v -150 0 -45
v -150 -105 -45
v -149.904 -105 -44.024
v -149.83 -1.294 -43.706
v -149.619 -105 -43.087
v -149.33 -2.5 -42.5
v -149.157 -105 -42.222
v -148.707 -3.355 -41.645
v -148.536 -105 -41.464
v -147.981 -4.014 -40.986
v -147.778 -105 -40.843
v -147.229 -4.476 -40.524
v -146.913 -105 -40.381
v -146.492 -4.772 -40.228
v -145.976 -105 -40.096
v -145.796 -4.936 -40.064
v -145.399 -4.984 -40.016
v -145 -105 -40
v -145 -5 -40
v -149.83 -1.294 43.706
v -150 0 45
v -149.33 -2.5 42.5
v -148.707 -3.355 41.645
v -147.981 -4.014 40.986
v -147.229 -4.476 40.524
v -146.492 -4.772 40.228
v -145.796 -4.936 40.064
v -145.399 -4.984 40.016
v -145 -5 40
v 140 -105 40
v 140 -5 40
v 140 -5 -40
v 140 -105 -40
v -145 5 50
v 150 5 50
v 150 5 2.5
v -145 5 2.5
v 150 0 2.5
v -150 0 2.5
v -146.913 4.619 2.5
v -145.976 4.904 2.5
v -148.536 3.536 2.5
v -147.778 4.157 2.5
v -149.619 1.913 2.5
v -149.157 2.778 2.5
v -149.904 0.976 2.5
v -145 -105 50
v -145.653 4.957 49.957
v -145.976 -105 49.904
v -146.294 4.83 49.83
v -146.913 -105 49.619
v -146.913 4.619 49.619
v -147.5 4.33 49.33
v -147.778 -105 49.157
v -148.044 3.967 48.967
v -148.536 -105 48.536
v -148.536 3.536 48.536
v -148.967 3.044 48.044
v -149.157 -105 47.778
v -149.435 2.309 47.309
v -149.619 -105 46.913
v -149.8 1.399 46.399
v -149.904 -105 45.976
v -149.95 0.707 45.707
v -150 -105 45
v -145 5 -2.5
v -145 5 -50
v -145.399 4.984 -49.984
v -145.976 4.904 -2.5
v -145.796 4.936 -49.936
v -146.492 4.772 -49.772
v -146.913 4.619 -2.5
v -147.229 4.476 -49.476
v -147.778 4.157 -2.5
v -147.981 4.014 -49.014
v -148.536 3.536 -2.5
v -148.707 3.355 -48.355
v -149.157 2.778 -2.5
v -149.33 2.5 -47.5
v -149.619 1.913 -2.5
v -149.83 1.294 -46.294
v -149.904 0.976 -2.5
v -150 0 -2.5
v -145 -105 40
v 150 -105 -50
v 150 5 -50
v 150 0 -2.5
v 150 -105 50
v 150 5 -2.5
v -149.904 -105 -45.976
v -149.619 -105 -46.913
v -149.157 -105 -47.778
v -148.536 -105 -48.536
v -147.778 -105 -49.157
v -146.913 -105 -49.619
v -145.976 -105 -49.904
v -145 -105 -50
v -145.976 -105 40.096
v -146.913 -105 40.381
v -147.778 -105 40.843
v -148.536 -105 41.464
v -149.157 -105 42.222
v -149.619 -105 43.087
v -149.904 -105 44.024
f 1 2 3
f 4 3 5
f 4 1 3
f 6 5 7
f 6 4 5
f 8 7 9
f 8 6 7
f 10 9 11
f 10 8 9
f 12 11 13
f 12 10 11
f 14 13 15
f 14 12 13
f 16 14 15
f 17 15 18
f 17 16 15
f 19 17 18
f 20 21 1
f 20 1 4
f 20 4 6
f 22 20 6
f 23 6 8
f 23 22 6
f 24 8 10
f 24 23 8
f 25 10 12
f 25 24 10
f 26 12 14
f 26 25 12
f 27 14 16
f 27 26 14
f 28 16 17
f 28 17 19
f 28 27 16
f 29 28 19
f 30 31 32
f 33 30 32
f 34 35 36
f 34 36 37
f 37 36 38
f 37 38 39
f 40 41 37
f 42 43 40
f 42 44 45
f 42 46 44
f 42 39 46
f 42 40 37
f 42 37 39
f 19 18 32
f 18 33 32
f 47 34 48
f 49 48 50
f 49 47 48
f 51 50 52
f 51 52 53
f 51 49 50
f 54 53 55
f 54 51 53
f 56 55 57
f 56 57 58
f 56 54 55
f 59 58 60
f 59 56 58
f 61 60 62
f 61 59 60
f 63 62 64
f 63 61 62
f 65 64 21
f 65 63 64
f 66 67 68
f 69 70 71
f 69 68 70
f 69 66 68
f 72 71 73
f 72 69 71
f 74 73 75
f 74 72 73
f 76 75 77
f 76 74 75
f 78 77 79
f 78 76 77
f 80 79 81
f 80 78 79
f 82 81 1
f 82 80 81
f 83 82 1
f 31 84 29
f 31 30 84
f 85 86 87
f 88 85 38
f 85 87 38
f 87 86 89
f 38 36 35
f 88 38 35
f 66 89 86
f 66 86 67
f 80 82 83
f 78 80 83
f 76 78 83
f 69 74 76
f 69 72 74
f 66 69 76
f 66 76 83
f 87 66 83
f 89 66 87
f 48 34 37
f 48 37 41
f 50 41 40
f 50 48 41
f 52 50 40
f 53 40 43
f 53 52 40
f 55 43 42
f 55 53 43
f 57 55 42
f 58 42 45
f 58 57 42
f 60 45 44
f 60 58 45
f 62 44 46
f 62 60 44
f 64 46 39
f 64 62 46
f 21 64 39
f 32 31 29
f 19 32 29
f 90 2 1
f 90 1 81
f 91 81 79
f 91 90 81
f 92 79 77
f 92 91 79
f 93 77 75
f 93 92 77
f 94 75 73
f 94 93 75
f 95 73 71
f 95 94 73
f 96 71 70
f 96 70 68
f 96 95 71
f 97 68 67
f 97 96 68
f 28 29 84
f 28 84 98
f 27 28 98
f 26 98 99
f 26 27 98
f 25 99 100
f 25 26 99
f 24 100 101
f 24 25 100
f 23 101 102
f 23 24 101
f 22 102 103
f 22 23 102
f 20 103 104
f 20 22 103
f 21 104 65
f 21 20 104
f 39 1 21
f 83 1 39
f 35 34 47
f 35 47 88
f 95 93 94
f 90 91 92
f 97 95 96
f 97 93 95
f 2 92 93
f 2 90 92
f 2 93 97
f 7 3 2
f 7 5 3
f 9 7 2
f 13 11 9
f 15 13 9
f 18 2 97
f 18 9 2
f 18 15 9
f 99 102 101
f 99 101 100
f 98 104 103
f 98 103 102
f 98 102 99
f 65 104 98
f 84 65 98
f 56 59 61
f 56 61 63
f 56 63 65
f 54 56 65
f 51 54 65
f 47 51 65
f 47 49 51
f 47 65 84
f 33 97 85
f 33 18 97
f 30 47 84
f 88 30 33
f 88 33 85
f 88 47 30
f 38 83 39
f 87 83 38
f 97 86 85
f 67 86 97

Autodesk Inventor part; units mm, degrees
ref_plane "YZ Plane" through (0, 0, 0) normal (1, 0, 0) x (0, 1, 0)
ref_plane "XZ Plane" through (0, 0, 0) normal (0, 1, 0) x (-1, 0, 0)
ref_plane "XY Plane" through (0, 0, 0) normal (0, 0, 1) x (1, 0, 0)
sketch "草图1" plane through (0, 0, 0) normal (0, 1, 0) x (-1, 0, 0)
  line L0 (-150, -50) -> (150, -50)
  line L1 (150, -50) -> (150, 50)
  line L2 (150, 50) -> (-150, 50)
  line L3 (-150, 50) -> (-150, -50)
  line L4 (-150, -50) -> (150, 50) construction
  line L5 (150, -50) -> (-150, 50) construction
  point P0 (0, 0)
  dimension "d0" = 300
  dimension "d1" = 100
extrude "拉伸1" add sketch "草图1" along normal mid plane 10
sketch "草图2" plane through (0, 5, 0) normal (0, 1, 0) x (1, 0, 0)
  line L0 (-150, 50) -> (-150, -50) projected
  line L1 (150, -2.5) -> (-150, -2.5)
  line L2 (-150, -2.5) -> (-150, 2.5)
  line L3 (-150, 2.5) -> (150, 2.5)
  line L4 (150, 2.5) -> (150, -2.5)
  line L5 (150, -2.5) -> (-150, 2.5) construction
  line L6 (-150, -2.5) -> (150, 2.5) construction
  point P0 (0, 0)
  dimension "d4" = 5
extrude "拉伸2" cut sketch "草图2" against normal blind 5
sketch "草图3" plane through (0, -5, 0) normal (0, -1, 0) x (1, 0, 0)
  line L0 (-150, 50) -> (150, 50) projected
  line L1 (150, -50) -> (-150, -50) projected
  line L2 (150, 50) -> (140, 50)
  line L3 (140, 50) -> (140, -50)
  line L4 (140, -50) -> (150, -50)
  line L5 (150, -50) -> (150, 50)
  point P0 (0, 0)
extrude "拉伸3" add sketch "草图3" along normal blind 100
sketch "草图4" plane through (140, -5, -50) normal (-1, 0, 0) x (0, 0, 1)
  line L0 (100, 10) -> (100, -100) projected
  line L1 (100, 0) -> (0, 0) projected
  line L2 (100, -100) -> (90, -100)
  line L3 (90, -100) -> (90, 0)
  line L4 (90, 0) -> (100, 0)
  line L5 (100, 0) -> (100, -100)
  line L6 (0, -100) -> (0, 10) projected
  line L7 (0, -100) -> (10, -100)
  line L8 (10, -100) -> (10, 0)
  line L9 (10, 0) -> (0, 0)
  line L10 (0, 0) -> (0, -100)
  point P0 (50, 5)
extrude "拉伸4" add sketch "草图4" along normal blind 290
fillet "圆角1" radius 5 7 edges at (-150, -55, 40) (-150, -50, 50) (-150, -55, -40) (-150, -50, -50) (-150, -5, 0) (-150, 5, -26.25) (-150, 5, 26.25)
properties part number "滑盖上"
